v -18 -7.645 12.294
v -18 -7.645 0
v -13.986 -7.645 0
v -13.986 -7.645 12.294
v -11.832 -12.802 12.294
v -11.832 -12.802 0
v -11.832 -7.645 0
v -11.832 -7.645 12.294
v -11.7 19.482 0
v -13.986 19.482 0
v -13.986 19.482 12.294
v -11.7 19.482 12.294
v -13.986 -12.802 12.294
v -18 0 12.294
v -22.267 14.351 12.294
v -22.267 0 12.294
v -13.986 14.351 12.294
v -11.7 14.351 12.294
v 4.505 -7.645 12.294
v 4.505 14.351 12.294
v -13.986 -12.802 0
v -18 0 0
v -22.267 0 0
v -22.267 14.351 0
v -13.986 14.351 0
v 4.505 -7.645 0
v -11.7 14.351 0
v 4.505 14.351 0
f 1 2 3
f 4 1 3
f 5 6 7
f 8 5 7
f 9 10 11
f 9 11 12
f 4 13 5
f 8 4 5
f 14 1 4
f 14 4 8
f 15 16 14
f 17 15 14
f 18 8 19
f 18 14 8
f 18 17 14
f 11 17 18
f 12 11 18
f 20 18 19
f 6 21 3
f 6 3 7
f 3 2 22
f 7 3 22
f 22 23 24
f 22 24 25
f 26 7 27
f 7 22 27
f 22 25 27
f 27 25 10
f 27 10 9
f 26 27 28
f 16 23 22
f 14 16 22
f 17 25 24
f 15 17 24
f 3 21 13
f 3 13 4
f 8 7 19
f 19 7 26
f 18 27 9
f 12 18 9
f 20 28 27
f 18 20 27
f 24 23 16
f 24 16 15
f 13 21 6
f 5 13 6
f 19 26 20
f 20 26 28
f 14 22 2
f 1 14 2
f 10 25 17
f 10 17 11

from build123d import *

# Parameters (mm, degrees)
F0_W     = 4.2672
F0_H     = 14.351
F0_W_2   = 2.286
F0_H_2   = 5.1308
F0_W_3   = 2.154207
F0_H_3   = 5.1562
F1_DEPTH = 12.2936


with BuildPart() as f1:
    # F0 (on Top) → F1 (new body)
    with BuildSketch(Plane.XY):
        Polygon((-13.986457, 14.351), (-17.999657, 14.351), (-17.999657, 0), (-17.999657, -7.6454), (-13.986457, -7.6454), (-11.83225, -7.6454), (4.504743, -7.6454), (4.504743, 14.351), (-11.700457, 14.351), align=None)
        with Locations((-20.133257, 7.1755)):
            Rectangle(F0_W, F0_H)
        with Locations((-12.843457, 16.9164)):
            Rectangle(F0_W_2, F0_H_2)
        with Locations((-12.909353, -10.2235)):
            Rectangle(F0_W_3, F0_H_3)
    extrude(amount=F1_DEPTH)


solid = f1.part
